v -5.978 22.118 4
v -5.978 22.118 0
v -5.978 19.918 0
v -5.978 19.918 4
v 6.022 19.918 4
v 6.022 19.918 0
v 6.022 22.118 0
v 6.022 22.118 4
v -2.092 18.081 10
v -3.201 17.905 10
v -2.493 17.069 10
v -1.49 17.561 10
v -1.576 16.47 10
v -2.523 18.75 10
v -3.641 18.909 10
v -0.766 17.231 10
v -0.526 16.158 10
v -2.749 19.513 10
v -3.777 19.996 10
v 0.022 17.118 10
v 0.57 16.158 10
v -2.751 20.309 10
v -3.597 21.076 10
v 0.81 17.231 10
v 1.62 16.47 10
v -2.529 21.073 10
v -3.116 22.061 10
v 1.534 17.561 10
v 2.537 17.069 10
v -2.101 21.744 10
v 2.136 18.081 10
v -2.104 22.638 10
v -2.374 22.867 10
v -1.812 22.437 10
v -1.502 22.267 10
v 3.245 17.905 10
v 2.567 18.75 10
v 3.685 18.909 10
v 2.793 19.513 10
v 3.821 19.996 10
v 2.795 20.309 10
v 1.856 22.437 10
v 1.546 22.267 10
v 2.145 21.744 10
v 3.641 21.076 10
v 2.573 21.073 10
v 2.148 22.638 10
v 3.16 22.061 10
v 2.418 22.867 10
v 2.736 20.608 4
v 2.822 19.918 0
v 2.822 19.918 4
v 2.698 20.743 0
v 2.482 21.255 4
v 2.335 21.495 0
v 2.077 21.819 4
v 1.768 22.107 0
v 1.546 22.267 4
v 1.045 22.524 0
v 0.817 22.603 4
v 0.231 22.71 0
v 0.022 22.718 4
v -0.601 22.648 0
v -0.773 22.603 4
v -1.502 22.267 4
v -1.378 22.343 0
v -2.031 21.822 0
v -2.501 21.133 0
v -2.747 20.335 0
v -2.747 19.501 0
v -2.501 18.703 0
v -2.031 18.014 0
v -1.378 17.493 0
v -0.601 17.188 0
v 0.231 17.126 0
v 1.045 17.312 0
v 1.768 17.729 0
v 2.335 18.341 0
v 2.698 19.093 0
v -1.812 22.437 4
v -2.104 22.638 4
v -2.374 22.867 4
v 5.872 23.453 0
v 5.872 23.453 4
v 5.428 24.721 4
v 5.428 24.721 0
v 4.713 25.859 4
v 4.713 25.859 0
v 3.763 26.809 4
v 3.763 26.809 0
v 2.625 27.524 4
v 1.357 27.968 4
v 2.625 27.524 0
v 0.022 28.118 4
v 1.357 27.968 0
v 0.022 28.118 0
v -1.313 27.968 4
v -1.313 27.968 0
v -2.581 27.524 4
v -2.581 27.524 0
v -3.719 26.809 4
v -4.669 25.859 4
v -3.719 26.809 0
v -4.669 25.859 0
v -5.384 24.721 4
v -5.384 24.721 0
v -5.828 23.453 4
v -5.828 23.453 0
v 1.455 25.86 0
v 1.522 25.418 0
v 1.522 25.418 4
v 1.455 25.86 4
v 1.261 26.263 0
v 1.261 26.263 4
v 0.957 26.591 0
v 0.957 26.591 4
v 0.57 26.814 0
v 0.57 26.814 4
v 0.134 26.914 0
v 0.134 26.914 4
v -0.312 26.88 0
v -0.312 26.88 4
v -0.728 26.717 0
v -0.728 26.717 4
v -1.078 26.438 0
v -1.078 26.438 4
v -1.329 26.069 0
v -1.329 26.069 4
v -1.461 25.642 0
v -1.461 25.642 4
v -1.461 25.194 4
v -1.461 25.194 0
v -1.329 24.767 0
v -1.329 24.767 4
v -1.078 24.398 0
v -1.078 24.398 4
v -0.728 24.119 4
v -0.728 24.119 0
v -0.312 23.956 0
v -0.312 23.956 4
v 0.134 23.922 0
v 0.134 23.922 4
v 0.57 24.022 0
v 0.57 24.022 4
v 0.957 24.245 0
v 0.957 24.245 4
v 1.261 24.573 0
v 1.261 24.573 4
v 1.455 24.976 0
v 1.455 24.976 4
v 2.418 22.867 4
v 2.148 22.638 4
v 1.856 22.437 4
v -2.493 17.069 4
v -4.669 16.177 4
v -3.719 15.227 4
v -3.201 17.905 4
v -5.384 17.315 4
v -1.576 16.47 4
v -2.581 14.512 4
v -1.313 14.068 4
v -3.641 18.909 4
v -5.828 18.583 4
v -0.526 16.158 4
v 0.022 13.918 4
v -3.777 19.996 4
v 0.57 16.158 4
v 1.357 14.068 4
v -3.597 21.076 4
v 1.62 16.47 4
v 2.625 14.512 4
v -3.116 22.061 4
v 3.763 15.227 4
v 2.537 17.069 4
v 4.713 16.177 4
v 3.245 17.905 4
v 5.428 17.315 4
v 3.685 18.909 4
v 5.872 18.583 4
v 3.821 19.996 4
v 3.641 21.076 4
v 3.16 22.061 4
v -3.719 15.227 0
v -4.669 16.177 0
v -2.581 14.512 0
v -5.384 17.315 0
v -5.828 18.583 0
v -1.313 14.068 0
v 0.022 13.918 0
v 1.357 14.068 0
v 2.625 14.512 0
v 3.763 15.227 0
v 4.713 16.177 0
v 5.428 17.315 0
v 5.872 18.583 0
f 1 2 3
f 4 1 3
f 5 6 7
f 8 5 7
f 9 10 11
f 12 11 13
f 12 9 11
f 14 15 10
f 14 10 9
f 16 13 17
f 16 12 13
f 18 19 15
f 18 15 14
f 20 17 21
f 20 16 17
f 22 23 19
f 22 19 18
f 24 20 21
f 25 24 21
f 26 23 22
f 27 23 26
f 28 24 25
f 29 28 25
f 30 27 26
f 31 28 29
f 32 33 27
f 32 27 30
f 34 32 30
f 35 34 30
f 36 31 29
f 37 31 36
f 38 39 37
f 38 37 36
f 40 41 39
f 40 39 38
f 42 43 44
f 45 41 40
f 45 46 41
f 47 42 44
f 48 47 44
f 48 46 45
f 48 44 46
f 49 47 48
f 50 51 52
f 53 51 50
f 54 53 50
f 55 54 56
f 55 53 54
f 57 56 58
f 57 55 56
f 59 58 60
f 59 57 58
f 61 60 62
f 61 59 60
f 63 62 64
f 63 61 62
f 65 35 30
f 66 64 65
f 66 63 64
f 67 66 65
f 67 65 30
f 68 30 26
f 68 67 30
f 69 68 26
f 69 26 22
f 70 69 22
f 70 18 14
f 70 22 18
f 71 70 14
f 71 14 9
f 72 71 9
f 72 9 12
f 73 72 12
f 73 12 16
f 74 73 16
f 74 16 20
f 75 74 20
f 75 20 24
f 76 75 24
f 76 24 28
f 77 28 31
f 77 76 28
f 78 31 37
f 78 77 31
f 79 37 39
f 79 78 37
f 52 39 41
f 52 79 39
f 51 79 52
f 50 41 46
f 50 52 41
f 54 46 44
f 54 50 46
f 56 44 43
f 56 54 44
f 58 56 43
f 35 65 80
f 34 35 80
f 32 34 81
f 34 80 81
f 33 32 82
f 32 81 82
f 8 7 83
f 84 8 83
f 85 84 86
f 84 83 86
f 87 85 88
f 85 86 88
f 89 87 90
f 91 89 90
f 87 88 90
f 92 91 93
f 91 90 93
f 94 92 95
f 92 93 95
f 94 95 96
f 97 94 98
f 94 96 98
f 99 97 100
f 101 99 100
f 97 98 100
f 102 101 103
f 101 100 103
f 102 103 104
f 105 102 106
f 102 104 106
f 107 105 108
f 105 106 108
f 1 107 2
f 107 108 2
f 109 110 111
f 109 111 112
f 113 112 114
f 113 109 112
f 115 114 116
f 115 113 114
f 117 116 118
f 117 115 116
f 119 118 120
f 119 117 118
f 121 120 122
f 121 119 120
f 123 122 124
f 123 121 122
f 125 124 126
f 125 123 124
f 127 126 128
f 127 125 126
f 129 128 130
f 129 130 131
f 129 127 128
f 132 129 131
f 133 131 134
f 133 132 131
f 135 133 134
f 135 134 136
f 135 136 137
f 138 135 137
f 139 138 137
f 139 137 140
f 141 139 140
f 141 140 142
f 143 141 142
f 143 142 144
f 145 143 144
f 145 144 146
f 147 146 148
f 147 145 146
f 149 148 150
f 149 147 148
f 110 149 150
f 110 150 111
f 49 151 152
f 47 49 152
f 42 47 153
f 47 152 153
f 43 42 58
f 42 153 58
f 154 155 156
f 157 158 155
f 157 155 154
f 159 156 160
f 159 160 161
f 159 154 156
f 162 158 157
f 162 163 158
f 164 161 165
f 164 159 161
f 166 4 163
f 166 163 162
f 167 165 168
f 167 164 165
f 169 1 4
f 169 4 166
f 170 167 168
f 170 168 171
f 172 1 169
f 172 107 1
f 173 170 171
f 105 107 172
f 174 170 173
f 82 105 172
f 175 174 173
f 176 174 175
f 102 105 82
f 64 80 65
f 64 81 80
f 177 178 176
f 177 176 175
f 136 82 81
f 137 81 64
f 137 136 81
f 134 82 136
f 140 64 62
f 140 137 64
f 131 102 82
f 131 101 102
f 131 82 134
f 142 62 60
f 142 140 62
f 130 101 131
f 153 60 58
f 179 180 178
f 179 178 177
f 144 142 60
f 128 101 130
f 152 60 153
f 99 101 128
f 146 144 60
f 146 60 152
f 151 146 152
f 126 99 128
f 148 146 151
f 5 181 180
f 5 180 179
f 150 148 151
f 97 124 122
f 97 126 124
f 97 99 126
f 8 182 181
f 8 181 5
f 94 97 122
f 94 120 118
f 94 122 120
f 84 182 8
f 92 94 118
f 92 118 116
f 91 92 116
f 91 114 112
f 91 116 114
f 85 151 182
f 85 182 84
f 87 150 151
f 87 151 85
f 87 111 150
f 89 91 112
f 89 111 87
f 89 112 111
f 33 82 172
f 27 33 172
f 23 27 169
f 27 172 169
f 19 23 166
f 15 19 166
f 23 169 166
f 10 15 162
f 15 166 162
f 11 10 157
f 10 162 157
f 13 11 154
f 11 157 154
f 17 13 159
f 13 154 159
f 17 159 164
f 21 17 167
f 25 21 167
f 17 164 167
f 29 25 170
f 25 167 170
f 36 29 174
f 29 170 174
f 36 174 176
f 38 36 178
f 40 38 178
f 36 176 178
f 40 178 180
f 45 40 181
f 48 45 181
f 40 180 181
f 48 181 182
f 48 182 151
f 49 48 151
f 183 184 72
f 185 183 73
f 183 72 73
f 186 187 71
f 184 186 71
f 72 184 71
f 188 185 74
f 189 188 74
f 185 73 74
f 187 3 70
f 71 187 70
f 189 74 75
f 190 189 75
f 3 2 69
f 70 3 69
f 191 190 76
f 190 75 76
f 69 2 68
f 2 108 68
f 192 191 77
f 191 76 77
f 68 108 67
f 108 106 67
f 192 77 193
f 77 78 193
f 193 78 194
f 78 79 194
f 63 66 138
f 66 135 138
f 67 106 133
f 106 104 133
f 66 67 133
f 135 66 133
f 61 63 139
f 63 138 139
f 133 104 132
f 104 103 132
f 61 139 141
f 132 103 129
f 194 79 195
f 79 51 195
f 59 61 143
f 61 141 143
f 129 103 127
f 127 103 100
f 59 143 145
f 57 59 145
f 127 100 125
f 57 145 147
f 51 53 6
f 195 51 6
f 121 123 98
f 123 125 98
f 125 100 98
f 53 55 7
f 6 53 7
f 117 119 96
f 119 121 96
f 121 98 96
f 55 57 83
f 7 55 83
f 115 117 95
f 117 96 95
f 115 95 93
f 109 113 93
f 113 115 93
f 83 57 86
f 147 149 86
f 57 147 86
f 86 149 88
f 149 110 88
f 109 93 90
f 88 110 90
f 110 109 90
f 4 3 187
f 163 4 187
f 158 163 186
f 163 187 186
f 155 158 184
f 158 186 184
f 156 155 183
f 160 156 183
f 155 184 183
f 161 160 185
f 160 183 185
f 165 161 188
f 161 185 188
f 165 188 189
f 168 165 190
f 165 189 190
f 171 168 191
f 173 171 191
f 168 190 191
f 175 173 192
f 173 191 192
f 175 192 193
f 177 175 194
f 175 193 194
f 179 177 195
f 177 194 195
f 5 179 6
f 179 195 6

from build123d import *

# Parameters (mm, degrees)
SKETCH1_R           = 2.8
SKETCH1_R_2         = 1.5
BOSS_EXTRUDE3_DEPTH = 4
BOSS_EXTRUDE5_DEPTH = 10


with BuildPart() as part:
    # Sketch1 → Boss-Extrude3 (new body)
    with BuildSketch(Plane.XY):
        with BuildLine():
            Line((-5.977999231, 22.118015055), (-5.977999231, 19.918015055))
            ThreePointArc((-5.977999231, 19.918015055), (0.022000769, 13.918015055), (6.022000769, 19.918015055))
            Line((6.022000769, 19.918015055), (6.022000769, 22.118015055))
            ThreePointArc((6.022000769, 22.118015055), (0.022000769, 28.118015055), (-5.977999231, 22.118015055))
        make_face()
        with Locations((0.022000769, 19.918015055)):
            Circle(SKETCH1_R, mode=Mode.SUBTRACT)
        with Locations((0.022000769, 25.418015055)):
            Circle(SKETCH1_R_2, mode=Mode.SUBTRACT)
    extrude(amount=BOSS_EXTRUDE3_DEPTH)

    # Sketch1<8> → Boss-Extrude5 (add)
    with BuildSketch(Plane.XY):
        with BuildLine():
            ThreePointArc((-2.374426324, 22.867105964), (0.022000769, 16.118015055), (2.418427861, 22.867105964))
            ThreePointArc((2.418427861, 22.867105964), (2.004907724, 22.533906873), (1.545736934, 22.267105964))
            ThreePointArc((1.545736934, 22.267105964), (0.022000769, 17.118015055), (-1.501735396, 22.267105964))
            ThreePointArc((-1.501735396, 22.267105964), (-1.960906186, 22.533906873), (-2.374426324, 22.867105964))
        make_face()
    extrude(amount=BOSS_EXTRUDE5_DEPTH)


solid = part.part
